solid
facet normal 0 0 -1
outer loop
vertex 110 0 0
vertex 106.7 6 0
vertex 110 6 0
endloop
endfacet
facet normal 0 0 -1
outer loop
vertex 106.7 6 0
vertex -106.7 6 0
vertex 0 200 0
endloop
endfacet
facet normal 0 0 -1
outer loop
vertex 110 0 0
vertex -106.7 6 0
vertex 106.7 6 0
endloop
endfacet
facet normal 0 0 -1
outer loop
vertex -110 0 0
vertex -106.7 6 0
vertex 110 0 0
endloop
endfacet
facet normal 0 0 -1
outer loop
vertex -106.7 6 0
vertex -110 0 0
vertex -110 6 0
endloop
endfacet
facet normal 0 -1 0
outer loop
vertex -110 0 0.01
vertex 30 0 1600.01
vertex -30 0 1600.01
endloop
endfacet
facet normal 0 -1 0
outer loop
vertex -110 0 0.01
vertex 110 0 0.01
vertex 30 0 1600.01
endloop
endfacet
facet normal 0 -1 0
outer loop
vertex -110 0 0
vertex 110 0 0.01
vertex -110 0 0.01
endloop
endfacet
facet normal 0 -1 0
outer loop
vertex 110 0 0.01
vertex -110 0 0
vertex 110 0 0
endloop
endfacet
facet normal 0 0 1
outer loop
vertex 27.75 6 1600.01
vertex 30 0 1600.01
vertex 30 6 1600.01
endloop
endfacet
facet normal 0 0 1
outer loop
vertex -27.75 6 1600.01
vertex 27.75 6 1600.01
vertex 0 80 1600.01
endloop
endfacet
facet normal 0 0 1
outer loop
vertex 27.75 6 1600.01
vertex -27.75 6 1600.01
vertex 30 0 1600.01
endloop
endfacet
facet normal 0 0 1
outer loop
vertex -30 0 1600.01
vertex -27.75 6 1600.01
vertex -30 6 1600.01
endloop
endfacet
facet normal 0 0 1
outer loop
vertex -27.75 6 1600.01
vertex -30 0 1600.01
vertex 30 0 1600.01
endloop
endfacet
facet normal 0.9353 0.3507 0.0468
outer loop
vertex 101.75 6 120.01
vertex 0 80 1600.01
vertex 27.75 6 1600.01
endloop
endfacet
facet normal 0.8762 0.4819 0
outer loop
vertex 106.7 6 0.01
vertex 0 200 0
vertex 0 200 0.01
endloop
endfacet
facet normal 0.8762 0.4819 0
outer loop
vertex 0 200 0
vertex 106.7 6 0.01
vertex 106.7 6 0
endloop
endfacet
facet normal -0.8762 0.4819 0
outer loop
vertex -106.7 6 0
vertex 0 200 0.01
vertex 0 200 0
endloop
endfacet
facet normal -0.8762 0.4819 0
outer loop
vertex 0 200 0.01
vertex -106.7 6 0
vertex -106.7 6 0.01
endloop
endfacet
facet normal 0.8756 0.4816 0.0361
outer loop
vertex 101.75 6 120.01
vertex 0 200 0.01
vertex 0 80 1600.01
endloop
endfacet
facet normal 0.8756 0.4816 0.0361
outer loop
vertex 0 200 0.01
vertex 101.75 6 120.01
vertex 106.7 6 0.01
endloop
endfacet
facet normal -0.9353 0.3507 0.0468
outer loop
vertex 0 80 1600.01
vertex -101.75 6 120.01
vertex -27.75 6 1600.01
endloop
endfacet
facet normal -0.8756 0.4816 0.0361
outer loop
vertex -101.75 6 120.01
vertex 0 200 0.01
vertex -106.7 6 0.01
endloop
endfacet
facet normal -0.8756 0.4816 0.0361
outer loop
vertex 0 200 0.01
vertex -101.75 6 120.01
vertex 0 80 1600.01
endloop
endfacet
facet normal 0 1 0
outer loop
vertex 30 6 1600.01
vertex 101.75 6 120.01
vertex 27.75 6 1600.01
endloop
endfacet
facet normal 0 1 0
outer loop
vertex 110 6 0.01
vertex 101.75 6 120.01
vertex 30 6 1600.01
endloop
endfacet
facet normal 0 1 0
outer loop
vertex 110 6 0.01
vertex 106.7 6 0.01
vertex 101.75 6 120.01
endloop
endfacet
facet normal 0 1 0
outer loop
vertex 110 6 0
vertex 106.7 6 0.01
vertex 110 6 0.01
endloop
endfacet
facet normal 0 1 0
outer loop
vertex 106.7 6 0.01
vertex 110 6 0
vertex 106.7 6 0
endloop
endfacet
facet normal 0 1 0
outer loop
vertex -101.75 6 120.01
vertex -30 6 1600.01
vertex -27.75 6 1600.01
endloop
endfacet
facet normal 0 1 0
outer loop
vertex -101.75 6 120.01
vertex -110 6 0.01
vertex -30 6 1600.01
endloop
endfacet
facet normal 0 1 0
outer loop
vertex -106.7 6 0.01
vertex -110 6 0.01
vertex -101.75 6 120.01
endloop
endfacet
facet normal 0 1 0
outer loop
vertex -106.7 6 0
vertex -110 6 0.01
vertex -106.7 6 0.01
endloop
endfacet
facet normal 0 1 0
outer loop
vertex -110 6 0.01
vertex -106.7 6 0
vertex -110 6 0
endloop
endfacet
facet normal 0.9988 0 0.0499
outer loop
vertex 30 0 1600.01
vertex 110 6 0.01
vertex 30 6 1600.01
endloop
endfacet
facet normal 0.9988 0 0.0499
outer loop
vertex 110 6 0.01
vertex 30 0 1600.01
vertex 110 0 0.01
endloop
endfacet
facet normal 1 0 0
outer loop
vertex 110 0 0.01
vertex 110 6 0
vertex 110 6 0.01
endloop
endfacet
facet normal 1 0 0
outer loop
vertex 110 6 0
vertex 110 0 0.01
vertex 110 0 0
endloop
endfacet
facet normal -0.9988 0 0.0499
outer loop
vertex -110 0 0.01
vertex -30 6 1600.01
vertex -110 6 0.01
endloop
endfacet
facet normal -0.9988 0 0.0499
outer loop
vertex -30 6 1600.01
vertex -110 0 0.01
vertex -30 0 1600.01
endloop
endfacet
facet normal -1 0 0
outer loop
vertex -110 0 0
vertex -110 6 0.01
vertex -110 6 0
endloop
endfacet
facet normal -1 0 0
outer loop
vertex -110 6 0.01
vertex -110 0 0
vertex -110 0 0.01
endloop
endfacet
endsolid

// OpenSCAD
// Tromba Marina — GENERIC parametric envelope scaffold.
//
// Authority: pending_measurement. NOT fabrication authority. This packet is a
// concept study: design.md records only NAMED UNKNOWNS (pending_body_length,
// pending_string_scale_length, pending_bridge_*, etc.) and supplies NO
// reference dimensions. Every numeric value below is therefore an explicit
// PLACEHOLDER chosen only so the envelope renders — it is NOT derived from any
// reference, measurement, or design-table cell, and MUST be replaced from a
// selected historical reference / bench-rig constraint before any CAD or shop
// work. See design.md "Parametric Intent" and visual-output-register.csv.
//
// Nothing here claims historical dimensions, tuning, harmonic node locations,
// bridge geometry, string tension, body material, or soundboard thickness.
//
// Units: millimeters (all PLACEHOLDER).

/* [PLACEHOLDER body envelope — NO reference dimension exists] */
// Generic long-tapered tromba-marina silhouette. Replace from a reviewed
// reference drawing (design.md: pending_body_length).
body_length_mm      = 1600;   // PLACEHOLDER (pending_body_length)
base_width_mm       = 220;    // PLACEHOLDER (three-sided body, wide foot)
top_width_mm        = 60;     // PLACEHOLDER (narrow bowing end)
base_depth_mm       = 200;    // PLACEHOLDER (triangular section depth)
soundboard_thick_mm = 6;      // PLACEHOLDER (pending_soundboard_material)

/* [PLACEHOLDER single bowed string — pending_string_scale_length] */
string_scale_mm     = 1500;   // PLACEHOLDER (pending_string_scale_length)
string_count        = 1;      // single bowed string is the retained identity

/* [PLACEHOLDER trumpet bridge — pending_bridge_* / loose foot] */
bridge_height_mm    = 45;     // PLACEHOLDER (pending_bridge_height)
bridge_from_foot_mm = 220;    // PLACEHOLDER bridge station up from the base
loose_foot_gap_mm   = 1.2;    // PLACEHOLDER (pending_bridge_loose_foot_gap)

/* [PLACEHOLDER optional sympathetic strings — pending_sympathetic_*] */
symp_count          = 4;      // PLACEHOLDER (optional branch; may be zero)
symp_spacing_mm     = 14;     // PLACEHOLDER

$fn = 48;

// ---------------------------------------------------------------------------
// Modules — generic silhouette only.
// ---------------------------------------------------------------------------

module body_shell() {
  // Tapered triangular-section body (three-sided tromba-marina family form).
  hull() {
    // foot (wide) cross-section
    translate([0, 0, 0]) linear_extrude(0.01) triangle(base_width_mm, base_depth_mm);
    // top (narrow) cross-section
    translate([0, 0, body_length_mm]) linear_extrude(0.01)
      triangle(top_width_mm, base_depth_mm * 0.4);
  }
}

module triangle(w, d) {
  polygon(points = [[-w/2, 0], [w/2, 0], [0, d]]);
}

module soundboard_face() {
  // Front face plate the string + bridge bear on (y = 0 face).
  hull() {
    translate([-base_width_mm/2, 0, 0]) cube([base_width_mm, soundboard_thick_mm, 0.01]);
    translate([-top_width_mm/2, 0, body_length_mm]) cube([top_width_mm, soundboard_thick_mm, 0.01]);
  }
}

module trumpet_bridge() {
  // Asymmetric bridge near the foot: one solid foot, one loose foot lifted by
  // loose_foot_gap_mm so it can rattle (buzz) against the soundboard.
  translate([0, soundboard_thick_mm, bridge_from_foot_mm]) {
    // solid foot
    translate([-30, 0, 0]) cube([12, 8, bridge_height_mm]);
    // loose foot (raised by the gap — the buzzing foot)
    translate([18, 0, loose_foot_gap_mm]) cube([12, 8, bridge_height_mm - loose_foot_gap_mm]);
    // saddle top bar carrying the string
    translate([-30, 0, bridge_height_mm]) cube([60, 8, 6]);
  }
}

module main_string() {
  // Single bowed string down the front face from the top to the bridge saddle.
  x = 0;
  hull() {
    translate([x, soundboard_thick_mm + 4, body_length_mm - (body_length_mm - string_scale_mm)])
      sphere(1);
    translate([x, soundboard_thick_mm + 8 + bridge_height_mm,
               bridge_from_foot_mm + bridge_height_mm]) sphere(1);
  }
}

module sympathetic_strings() {
  // Optional internal sympathetic strings (may be omitted entirely).
  for (i = [0 : max(symp_count, 1) - 1]) {
    x = -symp_spacing_mm * (symp_count - 1) / 2 + i * symp_spacing_mm;
    if (symp_count > 0)
      hull() {
        translate([x, base_depth_mm * 0.25, bridge_from_foot_mm]) sphere(0.6);
        translate([x, base_depth_mm * 0.20, body_length_mm * 0.85]) sphere(0.6);
      }
  }
}

module tromba_assembly() {
  body_shell();
  soundboard_face();
  trumpet_bridge();
  main_string();
  sympathetic_strings();
}

tromba_assembly();

echo("ALL DIMENSIONS ARE PLACEHOLDERS — no reference measurement exists yet.");
echo(str("PLACEHOLDER body_length_mm=", body_length_mm,
         " string_scale_mm=", string_scale_mm,
         " loose_foot_gap_mm=", loose_foot_gap_mm));
